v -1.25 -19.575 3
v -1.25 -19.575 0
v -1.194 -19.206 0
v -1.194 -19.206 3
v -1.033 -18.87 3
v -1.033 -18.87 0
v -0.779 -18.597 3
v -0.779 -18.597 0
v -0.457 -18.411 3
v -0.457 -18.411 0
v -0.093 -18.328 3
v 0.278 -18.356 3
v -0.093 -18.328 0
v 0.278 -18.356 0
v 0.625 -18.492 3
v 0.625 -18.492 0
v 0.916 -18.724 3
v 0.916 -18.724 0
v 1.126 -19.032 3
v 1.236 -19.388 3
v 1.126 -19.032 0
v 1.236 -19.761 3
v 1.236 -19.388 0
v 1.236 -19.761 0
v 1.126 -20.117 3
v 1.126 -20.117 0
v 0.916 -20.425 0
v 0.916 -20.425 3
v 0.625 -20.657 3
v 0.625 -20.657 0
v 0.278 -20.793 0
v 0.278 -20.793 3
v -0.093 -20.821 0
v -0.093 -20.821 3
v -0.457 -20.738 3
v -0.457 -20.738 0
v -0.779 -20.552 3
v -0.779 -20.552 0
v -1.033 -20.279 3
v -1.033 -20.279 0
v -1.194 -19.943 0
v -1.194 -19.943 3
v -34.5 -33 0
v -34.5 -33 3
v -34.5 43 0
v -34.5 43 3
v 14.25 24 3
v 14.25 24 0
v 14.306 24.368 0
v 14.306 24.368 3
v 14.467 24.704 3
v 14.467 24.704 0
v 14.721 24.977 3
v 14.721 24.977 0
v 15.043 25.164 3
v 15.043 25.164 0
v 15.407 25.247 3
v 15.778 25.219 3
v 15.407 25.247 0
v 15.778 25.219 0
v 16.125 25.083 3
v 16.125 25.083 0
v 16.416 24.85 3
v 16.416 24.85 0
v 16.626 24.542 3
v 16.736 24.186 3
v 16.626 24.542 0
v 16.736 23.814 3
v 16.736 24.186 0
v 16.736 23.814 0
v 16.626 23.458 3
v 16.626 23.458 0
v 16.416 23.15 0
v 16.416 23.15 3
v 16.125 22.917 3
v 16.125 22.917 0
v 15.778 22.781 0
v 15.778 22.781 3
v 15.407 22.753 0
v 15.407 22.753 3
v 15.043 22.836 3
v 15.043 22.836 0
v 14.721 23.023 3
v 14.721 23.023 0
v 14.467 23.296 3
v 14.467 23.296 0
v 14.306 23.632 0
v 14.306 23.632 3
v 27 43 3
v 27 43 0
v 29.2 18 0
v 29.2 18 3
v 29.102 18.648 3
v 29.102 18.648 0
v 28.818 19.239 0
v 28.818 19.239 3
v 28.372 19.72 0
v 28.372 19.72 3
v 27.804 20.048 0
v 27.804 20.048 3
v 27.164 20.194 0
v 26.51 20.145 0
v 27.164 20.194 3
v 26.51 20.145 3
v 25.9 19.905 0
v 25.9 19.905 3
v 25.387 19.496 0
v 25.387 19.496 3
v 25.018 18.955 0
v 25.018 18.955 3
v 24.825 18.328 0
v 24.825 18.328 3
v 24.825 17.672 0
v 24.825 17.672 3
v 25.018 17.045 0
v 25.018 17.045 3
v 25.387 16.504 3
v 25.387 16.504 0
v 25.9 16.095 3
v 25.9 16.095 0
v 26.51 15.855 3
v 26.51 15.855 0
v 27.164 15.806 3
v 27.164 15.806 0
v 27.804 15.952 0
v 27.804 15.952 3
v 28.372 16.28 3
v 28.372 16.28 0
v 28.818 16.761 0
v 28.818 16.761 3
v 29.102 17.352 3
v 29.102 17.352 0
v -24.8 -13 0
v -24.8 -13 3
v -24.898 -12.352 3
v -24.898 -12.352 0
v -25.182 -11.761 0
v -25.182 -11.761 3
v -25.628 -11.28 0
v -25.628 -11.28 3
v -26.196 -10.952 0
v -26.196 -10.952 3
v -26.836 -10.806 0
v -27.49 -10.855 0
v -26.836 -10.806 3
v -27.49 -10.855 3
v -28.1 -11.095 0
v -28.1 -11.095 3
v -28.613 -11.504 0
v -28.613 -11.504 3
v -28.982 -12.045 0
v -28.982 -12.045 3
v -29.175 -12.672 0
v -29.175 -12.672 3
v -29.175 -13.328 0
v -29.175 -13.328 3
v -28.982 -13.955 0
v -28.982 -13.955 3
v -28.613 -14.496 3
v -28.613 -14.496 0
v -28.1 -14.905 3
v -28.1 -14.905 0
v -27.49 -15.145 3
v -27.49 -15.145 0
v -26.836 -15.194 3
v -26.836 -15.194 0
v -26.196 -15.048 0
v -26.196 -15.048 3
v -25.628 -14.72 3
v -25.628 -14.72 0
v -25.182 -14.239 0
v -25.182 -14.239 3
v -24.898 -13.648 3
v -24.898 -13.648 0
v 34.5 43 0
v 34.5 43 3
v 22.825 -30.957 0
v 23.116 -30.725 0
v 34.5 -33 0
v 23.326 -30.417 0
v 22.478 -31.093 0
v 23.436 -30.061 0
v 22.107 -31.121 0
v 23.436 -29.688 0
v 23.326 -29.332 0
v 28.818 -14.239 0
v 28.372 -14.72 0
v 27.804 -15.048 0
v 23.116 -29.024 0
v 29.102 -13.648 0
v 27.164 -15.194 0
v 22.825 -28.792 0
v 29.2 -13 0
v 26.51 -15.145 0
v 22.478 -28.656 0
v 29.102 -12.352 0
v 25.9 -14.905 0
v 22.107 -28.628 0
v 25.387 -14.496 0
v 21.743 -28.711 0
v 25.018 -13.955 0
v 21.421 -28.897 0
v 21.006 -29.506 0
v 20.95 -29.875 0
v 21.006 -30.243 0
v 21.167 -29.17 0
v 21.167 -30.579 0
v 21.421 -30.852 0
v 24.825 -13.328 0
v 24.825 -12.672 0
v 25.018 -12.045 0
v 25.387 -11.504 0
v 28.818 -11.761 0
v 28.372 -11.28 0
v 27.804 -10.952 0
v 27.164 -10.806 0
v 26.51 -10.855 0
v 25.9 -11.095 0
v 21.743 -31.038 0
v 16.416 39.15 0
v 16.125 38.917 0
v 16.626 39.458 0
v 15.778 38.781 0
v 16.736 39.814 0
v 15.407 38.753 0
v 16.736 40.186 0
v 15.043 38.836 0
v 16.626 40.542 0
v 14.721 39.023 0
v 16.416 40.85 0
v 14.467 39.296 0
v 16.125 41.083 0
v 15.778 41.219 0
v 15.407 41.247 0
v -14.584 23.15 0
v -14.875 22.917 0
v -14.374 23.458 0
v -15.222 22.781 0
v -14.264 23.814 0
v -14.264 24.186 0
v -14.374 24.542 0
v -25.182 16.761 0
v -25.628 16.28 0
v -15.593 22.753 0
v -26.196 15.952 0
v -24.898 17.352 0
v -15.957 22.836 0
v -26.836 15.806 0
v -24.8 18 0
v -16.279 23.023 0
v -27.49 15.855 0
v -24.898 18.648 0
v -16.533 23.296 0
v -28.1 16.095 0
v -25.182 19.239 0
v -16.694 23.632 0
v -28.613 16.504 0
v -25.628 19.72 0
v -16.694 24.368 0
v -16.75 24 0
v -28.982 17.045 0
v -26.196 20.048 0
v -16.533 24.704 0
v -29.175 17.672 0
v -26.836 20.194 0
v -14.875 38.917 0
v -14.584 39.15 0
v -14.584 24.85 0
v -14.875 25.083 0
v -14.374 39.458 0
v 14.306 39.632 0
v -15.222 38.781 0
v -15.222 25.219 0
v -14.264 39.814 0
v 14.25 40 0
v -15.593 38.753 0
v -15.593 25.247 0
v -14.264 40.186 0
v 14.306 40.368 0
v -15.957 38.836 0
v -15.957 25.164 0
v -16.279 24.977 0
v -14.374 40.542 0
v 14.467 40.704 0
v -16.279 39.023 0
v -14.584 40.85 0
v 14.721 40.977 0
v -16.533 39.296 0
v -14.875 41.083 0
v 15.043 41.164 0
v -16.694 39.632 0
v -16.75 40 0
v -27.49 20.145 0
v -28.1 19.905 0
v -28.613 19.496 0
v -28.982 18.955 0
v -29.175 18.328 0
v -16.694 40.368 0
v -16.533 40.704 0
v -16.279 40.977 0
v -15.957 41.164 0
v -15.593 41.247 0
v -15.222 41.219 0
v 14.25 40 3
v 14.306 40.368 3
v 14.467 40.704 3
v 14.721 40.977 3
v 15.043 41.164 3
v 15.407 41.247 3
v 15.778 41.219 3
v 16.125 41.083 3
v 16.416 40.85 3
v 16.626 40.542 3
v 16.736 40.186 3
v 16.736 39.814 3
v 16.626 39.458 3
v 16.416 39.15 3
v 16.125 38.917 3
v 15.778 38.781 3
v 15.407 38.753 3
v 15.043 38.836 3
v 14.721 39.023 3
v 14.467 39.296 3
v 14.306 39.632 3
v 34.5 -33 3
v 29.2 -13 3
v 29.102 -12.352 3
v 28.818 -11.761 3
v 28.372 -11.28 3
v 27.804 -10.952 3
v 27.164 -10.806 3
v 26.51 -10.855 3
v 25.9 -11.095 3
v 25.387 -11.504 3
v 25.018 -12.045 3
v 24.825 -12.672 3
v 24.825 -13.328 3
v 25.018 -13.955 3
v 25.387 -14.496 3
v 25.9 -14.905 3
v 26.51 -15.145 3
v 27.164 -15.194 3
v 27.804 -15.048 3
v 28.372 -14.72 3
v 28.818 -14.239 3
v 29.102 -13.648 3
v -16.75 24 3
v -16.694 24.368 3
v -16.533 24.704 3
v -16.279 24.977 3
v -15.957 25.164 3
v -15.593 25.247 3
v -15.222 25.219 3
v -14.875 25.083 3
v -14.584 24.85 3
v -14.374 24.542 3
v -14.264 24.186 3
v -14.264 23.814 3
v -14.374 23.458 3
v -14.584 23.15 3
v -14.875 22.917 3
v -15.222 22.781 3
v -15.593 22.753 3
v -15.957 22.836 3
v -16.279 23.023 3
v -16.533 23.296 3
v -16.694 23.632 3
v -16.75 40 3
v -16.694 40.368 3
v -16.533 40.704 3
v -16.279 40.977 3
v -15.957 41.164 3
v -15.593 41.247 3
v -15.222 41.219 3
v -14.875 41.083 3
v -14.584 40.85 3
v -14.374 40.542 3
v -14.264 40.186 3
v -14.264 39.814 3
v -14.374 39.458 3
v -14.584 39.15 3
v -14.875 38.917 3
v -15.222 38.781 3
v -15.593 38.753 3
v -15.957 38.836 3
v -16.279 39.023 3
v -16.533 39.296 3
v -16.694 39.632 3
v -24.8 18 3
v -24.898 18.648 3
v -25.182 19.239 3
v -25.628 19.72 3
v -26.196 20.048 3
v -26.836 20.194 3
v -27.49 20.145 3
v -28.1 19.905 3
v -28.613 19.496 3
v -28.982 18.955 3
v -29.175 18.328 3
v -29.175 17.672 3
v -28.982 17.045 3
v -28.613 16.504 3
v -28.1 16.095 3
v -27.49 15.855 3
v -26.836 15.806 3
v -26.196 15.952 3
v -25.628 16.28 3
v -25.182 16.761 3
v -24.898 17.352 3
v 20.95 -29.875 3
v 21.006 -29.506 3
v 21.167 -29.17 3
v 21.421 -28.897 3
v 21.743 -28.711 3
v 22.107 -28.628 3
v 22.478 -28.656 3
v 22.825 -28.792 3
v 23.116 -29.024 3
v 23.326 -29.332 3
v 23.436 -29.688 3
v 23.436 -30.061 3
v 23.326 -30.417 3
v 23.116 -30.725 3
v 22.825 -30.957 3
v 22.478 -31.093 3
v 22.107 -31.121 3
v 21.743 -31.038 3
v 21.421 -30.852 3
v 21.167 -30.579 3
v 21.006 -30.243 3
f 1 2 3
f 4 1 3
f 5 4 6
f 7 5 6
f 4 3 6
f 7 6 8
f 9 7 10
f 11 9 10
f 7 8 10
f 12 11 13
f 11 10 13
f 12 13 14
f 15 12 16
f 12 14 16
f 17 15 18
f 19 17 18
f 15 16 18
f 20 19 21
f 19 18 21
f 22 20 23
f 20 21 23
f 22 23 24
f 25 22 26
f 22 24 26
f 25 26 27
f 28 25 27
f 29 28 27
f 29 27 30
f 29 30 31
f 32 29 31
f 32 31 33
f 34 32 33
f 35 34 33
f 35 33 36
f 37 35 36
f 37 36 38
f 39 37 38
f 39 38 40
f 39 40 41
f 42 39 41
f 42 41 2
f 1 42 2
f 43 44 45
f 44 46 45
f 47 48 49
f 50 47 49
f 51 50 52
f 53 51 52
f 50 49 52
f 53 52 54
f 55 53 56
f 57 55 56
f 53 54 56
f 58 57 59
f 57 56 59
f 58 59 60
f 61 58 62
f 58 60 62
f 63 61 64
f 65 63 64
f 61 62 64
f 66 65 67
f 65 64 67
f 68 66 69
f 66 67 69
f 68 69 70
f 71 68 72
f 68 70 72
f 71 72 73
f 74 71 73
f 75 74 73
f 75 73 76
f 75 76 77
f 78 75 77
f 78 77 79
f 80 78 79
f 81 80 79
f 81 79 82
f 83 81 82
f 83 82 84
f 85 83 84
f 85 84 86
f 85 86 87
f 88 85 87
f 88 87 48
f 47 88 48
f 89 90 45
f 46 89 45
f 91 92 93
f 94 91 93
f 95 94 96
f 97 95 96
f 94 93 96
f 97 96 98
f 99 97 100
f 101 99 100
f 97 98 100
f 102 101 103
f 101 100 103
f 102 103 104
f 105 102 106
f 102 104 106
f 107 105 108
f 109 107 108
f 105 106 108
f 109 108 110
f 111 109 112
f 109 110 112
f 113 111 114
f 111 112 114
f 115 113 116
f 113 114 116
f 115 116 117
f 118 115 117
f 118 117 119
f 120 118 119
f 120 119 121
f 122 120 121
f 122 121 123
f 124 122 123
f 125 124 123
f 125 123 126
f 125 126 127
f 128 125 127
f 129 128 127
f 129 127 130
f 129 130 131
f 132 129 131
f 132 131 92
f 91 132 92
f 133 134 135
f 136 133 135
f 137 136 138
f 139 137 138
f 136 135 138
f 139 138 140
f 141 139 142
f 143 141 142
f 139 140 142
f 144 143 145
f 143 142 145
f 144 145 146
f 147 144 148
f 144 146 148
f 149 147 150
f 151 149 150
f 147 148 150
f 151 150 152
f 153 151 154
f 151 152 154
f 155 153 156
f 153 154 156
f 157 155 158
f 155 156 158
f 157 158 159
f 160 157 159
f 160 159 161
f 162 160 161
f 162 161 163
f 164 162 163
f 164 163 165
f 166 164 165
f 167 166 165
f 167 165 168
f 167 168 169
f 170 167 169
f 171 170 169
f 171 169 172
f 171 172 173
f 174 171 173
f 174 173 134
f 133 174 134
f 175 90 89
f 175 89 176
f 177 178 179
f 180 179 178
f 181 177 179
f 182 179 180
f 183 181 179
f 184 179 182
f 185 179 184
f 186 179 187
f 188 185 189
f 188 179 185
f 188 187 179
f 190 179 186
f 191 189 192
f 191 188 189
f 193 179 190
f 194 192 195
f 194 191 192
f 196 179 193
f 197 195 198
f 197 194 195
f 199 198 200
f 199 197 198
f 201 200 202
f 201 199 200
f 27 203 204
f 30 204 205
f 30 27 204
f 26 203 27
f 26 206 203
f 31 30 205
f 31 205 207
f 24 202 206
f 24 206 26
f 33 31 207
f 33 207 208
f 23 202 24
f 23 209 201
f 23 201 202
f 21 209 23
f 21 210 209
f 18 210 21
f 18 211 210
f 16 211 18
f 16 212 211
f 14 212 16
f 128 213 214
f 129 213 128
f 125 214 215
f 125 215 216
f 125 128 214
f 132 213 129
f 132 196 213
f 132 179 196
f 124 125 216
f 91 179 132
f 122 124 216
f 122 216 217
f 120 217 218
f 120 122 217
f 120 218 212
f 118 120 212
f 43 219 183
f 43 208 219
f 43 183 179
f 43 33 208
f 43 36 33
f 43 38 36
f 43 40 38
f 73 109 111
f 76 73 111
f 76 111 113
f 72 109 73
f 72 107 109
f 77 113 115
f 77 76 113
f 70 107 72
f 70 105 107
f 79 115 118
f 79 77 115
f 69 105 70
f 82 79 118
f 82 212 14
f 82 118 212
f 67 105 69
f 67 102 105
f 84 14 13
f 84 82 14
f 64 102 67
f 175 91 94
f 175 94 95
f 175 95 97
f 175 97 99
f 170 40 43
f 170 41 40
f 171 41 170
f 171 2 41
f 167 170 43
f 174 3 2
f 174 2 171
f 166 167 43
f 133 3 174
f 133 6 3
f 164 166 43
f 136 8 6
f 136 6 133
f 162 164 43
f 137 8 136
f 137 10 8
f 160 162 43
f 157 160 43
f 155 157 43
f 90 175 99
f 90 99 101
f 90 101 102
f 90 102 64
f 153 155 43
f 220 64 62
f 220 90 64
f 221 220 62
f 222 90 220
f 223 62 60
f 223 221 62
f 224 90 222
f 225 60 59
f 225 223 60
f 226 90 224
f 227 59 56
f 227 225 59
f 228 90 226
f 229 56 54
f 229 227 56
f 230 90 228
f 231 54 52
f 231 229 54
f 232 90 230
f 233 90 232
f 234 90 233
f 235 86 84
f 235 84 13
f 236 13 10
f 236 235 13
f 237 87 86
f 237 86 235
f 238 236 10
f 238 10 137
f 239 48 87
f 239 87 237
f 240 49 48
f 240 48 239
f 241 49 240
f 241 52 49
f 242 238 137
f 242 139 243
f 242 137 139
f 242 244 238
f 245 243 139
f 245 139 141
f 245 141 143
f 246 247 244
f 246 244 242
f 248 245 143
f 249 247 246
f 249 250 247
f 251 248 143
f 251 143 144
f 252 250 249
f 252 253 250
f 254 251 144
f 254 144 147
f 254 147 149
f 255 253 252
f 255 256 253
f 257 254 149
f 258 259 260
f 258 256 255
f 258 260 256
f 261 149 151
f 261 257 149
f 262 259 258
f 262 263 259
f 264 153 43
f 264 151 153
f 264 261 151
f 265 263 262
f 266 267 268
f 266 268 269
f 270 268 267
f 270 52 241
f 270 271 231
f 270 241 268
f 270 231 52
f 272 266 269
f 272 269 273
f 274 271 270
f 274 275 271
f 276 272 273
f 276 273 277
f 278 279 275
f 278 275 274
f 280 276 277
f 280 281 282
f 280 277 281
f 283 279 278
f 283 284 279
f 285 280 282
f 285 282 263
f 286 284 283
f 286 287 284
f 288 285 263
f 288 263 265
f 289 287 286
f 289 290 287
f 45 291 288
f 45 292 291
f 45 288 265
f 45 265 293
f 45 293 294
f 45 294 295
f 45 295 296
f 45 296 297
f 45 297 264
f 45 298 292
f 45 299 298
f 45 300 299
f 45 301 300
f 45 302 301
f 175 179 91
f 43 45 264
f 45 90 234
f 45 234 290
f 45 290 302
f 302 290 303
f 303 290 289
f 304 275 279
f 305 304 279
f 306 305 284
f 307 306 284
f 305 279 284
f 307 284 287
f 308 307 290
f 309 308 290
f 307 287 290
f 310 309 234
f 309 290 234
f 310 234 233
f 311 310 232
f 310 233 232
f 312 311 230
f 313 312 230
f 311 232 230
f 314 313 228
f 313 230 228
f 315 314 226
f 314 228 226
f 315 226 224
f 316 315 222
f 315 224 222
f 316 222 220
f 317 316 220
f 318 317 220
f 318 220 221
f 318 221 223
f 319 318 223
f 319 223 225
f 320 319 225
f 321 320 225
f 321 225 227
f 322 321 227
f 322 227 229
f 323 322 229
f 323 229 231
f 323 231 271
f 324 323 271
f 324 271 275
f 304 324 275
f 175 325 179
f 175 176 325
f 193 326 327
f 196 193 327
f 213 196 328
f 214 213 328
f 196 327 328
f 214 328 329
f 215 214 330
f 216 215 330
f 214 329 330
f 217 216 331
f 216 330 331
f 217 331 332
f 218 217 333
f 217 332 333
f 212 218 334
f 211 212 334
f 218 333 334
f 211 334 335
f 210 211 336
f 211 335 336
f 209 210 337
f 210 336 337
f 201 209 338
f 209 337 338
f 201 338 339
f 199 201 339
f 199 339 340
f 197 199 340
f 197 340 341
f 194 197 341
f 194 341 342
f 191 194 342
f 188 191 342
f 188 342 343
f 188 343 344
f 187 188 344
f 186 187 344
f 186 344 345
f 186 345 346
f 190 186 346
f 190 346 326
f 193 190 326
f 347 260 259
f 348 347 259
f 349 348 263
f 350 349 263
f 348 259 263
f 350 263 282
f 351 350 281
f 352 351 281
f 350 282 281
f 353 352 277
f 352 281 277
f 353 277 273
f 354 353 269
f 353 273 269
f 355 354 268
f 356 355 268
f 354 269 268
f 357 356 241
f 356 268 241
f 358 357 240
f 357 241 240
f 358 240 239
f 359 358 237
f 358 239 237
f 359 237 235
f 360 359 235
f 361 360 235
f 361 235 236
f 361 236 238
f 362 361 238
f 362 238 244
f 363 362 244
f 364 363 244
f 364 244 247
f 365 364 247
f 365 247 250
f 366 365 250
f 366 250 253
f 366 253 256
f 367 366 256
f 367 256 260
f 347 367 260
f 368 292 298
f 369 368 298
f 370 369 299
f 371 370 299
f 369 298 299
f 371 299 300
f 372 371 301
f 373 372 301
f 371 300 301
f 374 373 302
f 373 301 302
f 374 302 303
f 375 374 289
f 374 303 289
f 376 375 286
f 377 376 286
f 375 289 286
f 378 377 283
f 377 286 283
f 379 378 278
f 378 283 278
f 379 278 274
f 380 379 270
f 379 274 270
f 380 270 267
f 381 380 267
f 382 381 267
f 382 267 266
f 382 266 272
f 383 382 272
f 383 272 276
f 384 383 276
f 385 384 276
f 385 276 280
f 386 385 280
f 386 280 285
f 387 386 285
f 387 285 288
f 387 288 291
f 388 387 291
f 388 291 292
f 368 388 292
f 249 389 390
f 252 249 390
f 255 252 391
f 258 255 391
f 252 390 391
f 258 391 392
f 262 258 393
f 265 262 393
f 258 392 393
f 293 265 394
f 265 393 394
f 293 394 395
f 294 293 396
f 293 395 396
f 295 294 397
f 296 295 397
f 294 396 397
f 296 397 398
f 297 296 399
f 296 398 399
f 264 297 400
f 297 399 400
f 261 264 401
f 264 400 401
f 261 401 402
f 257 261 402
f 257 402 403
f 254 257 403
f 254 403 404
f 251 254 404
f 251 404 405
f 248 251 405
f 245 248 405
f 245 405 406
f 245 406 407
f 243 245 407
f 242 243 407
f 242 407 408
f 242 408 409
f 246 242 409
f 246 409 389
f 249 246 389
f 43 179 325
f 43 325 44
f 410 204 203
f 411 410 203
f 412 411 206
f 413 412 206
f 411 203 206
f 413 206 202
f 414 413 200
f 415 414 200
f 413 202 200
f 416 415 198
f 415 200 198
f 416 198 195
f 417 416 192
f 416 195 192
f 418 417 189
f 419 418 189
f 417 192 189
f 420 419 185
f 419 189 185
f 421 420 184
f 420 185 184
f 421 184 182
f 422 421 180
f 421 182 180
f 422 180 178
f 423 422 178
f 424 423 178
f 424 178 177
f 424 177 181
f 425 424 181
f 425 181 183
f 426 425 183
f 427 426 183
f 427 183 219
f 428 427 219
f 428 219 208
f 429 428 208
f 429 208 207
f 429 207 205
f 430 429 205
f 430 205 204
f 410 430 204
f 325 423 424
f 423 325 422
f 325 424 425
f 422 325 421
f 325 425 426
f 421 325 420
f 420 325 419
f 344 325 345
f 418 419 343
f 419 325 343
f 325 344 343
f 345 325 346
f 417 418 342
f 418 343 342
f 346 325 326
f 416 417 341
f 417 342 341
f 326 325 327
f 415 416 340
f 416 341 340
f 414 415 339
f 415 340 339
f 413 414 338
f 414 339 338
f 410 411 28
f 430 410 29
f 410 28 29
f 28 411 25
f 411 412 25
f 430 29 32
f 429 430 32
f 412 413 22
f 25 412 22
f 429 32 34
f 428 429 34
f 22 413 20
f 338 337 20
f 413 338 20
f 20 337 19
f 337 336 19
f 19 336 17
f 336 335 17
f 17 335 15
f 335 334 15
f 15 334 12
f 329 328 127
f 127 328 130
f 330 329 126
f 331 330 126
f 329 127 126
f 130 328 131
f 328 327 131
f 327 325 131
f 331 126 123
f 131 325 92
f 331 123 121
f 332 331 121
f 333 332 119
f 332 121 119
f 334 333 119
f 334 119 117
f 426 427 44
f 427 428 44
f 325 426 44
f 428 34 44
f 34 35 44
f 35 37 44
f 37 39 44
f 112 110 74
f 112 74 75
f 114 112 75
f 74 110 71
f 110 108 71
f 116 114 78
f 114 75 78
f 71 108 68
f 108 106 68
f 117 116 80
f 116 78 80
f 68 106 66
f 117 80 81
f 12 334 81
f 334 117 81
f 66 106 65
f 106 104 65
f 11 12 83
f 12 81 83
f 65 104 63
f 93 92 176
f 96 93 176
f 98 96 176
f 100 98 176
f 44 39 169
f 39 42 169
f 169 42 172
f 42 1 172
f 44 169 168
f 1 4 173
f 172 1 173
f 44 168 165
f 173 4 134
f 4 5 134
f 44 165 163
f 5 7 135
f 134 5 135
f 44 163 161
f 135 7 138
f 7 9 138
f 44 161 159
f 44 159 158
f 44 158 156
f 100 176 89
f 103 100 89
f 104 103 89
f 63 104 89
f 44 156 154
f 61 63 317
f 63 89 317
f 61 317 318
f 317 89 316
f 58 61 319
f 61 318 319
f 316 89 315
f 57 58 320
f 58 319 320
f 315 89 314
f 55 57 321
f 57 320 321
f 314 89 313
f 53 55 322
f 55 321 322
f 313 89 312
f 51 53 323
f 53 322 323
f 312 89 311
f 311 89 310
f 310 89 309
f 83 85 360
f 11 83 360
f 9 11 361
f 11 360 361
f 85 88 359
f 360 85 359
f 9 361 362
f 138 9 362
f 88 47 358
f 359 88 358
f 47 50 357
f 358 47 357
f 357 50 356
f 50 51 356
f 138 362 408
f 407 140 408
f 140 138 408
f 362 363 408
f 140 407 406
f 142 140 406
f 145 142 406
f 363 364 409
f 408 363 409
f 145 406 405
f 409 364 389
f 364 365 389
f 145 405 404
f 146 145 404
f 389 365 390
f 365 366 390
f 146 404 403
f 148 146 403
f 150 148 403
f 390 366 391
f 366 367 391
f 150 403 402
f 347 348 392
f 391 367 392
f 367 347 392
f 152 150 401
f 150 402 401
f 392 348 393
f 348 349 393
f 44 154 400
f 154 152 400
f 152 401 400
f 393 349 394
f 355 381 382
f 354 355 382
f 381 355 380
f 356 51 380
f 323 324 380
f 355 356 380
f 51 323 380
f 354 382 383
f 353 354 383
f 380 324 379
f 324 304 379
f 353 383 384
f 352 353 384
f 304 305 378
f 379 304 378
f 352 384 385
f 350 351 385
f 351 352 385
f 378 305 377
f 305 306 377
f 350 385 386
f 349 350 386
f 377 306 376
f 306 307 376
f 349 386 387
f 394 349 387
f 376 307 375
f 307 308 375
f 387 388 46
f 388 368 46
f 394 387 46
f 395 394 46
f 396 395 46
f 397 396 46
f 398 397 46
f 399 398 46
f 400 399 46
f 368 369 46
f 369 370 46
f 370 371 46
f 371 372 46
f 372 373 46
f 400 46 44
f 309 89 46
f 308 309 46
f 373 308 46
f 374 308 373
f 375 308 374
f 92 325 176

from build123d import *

# Parameters (mm, degrees)
SKETCH_1_W          = 7.5
SKETCH_1_H          = 9.347826087
SKETCH_1_H_2        = 10
EXTRUDE_1_DEPTH     = 3
SKETCH_2_R          = 2.2
CUT_EXTRUDE_1_DEPTH = 4
M3X0_5_1_D          = 2.5
M3X0_5_1_DEPTH      = 8.5
M3X0_5_1_TIP        = 0.751075774
SKETCH_6_W          = 69
SKETCH_6_H          = 3
CUT_EXTRUDE_2_DEPTH = 20
SKETCH_7_W          = 69
SKETCH_7_H          = 3
EXTRUDE_2_DEPTH     = 10
M3X0_5_2_D          = 2.5
M3X0_5_2_DEPTH      = 8.5
M3X0_5_2_TIP        = 0.751075774


with BuildPart() as part:
    # ｽｹｯﾁ1 → ﾎﾞｽ - 押し出し1 (new body)
    with BuildSketch(Plane.XY):
        Polygon((27, 43), (-27, 43), (-27, 33.652173913), (-34.5, 33.652173913), (-34.5, -33), (-27, -33), (-27, -43), (27, -43), (27, -33), (34.5, -33), (34.5, 33.652173913), (27, 33.652173913), align=None)
        with Locations((-30.75, 38.326086956)):
            Rectangle(SKETCH_1_W, SKETCH_1_H)
        with Locations((30.75, 38.326086956)):
            Rectangle(SKETCH_1_W, SKETCH_1_H)
        with Locations((30.75, -38)):
            Rectangle(SKETCH_1_W, SKETCH_1_H_2)
        with Locations((-30.75, -38)):
            Rectangle(SKETCH_1_W, SKETCH_1_H_2)
    extrude(amount=EXTRUDE_1_DEPTH)

    # ｽｹｯﾁ2 → ｶｯﾄ - 押し出し1 (cut, through all)
    with BuildSketch(Plane.XY.offset(3)):
        with Locations((-27, 18)):
            Circle(SKETCH_2_R)
        with Locations((27, 18)):
            Circle(SKETCH_2_R)
        with Locations((27, -13)):
            Circle(SKETCH_2_R)
        with Locations((-27, -13)):
            Circle(SKETCH_2_R)
    extrude(amount=-CUT_EXTRUDE_1_DEPTH, mode=Mode.SUBTRACT)

    # M3x0.5 ねじ穴1
    with Locations(Plane(origin=(-15.5, 24, 3), x_dir=(1, 0, 0), z_dir=(0, 0, 1))):
        with Locations((0, 0), (31, 0), (0, 16), (31, 16)):
            Hole(M3X0_5_1_D / 2, depth=M3X0_5_1_DEPTH)
            with Locations((0, 0, -(M3X0_5_1_DEPTH + M3X0_5_1_TIP / 2))):  # 118° drill point
                Cone(0, M3X0_5_1_D / 2, M3X0_5_1_TIP, mode=Mode.SUBTRACT)

    # ｽｹｯﾁ6 → ｶｯﾄ - 押し出し2 (cut)
    with BuildSketch(Plane(origin=(0, -43, 0), x_dir=(-1, 0, 0), z_dir=(0, -1, 0))):
        with Locations((0, -1.5)):
            Rectangle(SKETCH_6_W, SKETCH_6_H)
    extrude(amount=-CUT_EXTRUDE_2_DEPTH, mode=Mode.SUBTRACT)

    # ｽｹｯﾁ7 → ﾎﾞｽ - 押し出し2 (add)
    with BuildSketch(Plane(origin=(0, -23, 0), x_dir=(-1, 0, 0), z_dir=(0, -1, 0))):
        with Locations((0, -1.5)):
            Rectangle(SKETCH_7_W, SKETCH_7_H)
    extrude(amount=EXTRUDE_2_DEPTH)

    # M3x0.5 ねじ穴2
    with Locations(Plane(origin=(0, -19.574626956, 3), x_dir=(1, 0, 0), z_dir=(0, 0, 1))):
        with Locations((0, 0), (22.2, -10.3)):
            Hole(M3X0_5_2_D / 2, depth=M3X0_5_2_DEPTH)
            with Locations((0, 0, -(M3X0_5_2_DEPTH + M3X0_5_2_TIP / 2))):  # 118° drill point
                Cone(0, M3X0_5_2_D / 2, M3X0_5_2_TIP, mode=Mode.SUBTRACT)


solid = part.part
